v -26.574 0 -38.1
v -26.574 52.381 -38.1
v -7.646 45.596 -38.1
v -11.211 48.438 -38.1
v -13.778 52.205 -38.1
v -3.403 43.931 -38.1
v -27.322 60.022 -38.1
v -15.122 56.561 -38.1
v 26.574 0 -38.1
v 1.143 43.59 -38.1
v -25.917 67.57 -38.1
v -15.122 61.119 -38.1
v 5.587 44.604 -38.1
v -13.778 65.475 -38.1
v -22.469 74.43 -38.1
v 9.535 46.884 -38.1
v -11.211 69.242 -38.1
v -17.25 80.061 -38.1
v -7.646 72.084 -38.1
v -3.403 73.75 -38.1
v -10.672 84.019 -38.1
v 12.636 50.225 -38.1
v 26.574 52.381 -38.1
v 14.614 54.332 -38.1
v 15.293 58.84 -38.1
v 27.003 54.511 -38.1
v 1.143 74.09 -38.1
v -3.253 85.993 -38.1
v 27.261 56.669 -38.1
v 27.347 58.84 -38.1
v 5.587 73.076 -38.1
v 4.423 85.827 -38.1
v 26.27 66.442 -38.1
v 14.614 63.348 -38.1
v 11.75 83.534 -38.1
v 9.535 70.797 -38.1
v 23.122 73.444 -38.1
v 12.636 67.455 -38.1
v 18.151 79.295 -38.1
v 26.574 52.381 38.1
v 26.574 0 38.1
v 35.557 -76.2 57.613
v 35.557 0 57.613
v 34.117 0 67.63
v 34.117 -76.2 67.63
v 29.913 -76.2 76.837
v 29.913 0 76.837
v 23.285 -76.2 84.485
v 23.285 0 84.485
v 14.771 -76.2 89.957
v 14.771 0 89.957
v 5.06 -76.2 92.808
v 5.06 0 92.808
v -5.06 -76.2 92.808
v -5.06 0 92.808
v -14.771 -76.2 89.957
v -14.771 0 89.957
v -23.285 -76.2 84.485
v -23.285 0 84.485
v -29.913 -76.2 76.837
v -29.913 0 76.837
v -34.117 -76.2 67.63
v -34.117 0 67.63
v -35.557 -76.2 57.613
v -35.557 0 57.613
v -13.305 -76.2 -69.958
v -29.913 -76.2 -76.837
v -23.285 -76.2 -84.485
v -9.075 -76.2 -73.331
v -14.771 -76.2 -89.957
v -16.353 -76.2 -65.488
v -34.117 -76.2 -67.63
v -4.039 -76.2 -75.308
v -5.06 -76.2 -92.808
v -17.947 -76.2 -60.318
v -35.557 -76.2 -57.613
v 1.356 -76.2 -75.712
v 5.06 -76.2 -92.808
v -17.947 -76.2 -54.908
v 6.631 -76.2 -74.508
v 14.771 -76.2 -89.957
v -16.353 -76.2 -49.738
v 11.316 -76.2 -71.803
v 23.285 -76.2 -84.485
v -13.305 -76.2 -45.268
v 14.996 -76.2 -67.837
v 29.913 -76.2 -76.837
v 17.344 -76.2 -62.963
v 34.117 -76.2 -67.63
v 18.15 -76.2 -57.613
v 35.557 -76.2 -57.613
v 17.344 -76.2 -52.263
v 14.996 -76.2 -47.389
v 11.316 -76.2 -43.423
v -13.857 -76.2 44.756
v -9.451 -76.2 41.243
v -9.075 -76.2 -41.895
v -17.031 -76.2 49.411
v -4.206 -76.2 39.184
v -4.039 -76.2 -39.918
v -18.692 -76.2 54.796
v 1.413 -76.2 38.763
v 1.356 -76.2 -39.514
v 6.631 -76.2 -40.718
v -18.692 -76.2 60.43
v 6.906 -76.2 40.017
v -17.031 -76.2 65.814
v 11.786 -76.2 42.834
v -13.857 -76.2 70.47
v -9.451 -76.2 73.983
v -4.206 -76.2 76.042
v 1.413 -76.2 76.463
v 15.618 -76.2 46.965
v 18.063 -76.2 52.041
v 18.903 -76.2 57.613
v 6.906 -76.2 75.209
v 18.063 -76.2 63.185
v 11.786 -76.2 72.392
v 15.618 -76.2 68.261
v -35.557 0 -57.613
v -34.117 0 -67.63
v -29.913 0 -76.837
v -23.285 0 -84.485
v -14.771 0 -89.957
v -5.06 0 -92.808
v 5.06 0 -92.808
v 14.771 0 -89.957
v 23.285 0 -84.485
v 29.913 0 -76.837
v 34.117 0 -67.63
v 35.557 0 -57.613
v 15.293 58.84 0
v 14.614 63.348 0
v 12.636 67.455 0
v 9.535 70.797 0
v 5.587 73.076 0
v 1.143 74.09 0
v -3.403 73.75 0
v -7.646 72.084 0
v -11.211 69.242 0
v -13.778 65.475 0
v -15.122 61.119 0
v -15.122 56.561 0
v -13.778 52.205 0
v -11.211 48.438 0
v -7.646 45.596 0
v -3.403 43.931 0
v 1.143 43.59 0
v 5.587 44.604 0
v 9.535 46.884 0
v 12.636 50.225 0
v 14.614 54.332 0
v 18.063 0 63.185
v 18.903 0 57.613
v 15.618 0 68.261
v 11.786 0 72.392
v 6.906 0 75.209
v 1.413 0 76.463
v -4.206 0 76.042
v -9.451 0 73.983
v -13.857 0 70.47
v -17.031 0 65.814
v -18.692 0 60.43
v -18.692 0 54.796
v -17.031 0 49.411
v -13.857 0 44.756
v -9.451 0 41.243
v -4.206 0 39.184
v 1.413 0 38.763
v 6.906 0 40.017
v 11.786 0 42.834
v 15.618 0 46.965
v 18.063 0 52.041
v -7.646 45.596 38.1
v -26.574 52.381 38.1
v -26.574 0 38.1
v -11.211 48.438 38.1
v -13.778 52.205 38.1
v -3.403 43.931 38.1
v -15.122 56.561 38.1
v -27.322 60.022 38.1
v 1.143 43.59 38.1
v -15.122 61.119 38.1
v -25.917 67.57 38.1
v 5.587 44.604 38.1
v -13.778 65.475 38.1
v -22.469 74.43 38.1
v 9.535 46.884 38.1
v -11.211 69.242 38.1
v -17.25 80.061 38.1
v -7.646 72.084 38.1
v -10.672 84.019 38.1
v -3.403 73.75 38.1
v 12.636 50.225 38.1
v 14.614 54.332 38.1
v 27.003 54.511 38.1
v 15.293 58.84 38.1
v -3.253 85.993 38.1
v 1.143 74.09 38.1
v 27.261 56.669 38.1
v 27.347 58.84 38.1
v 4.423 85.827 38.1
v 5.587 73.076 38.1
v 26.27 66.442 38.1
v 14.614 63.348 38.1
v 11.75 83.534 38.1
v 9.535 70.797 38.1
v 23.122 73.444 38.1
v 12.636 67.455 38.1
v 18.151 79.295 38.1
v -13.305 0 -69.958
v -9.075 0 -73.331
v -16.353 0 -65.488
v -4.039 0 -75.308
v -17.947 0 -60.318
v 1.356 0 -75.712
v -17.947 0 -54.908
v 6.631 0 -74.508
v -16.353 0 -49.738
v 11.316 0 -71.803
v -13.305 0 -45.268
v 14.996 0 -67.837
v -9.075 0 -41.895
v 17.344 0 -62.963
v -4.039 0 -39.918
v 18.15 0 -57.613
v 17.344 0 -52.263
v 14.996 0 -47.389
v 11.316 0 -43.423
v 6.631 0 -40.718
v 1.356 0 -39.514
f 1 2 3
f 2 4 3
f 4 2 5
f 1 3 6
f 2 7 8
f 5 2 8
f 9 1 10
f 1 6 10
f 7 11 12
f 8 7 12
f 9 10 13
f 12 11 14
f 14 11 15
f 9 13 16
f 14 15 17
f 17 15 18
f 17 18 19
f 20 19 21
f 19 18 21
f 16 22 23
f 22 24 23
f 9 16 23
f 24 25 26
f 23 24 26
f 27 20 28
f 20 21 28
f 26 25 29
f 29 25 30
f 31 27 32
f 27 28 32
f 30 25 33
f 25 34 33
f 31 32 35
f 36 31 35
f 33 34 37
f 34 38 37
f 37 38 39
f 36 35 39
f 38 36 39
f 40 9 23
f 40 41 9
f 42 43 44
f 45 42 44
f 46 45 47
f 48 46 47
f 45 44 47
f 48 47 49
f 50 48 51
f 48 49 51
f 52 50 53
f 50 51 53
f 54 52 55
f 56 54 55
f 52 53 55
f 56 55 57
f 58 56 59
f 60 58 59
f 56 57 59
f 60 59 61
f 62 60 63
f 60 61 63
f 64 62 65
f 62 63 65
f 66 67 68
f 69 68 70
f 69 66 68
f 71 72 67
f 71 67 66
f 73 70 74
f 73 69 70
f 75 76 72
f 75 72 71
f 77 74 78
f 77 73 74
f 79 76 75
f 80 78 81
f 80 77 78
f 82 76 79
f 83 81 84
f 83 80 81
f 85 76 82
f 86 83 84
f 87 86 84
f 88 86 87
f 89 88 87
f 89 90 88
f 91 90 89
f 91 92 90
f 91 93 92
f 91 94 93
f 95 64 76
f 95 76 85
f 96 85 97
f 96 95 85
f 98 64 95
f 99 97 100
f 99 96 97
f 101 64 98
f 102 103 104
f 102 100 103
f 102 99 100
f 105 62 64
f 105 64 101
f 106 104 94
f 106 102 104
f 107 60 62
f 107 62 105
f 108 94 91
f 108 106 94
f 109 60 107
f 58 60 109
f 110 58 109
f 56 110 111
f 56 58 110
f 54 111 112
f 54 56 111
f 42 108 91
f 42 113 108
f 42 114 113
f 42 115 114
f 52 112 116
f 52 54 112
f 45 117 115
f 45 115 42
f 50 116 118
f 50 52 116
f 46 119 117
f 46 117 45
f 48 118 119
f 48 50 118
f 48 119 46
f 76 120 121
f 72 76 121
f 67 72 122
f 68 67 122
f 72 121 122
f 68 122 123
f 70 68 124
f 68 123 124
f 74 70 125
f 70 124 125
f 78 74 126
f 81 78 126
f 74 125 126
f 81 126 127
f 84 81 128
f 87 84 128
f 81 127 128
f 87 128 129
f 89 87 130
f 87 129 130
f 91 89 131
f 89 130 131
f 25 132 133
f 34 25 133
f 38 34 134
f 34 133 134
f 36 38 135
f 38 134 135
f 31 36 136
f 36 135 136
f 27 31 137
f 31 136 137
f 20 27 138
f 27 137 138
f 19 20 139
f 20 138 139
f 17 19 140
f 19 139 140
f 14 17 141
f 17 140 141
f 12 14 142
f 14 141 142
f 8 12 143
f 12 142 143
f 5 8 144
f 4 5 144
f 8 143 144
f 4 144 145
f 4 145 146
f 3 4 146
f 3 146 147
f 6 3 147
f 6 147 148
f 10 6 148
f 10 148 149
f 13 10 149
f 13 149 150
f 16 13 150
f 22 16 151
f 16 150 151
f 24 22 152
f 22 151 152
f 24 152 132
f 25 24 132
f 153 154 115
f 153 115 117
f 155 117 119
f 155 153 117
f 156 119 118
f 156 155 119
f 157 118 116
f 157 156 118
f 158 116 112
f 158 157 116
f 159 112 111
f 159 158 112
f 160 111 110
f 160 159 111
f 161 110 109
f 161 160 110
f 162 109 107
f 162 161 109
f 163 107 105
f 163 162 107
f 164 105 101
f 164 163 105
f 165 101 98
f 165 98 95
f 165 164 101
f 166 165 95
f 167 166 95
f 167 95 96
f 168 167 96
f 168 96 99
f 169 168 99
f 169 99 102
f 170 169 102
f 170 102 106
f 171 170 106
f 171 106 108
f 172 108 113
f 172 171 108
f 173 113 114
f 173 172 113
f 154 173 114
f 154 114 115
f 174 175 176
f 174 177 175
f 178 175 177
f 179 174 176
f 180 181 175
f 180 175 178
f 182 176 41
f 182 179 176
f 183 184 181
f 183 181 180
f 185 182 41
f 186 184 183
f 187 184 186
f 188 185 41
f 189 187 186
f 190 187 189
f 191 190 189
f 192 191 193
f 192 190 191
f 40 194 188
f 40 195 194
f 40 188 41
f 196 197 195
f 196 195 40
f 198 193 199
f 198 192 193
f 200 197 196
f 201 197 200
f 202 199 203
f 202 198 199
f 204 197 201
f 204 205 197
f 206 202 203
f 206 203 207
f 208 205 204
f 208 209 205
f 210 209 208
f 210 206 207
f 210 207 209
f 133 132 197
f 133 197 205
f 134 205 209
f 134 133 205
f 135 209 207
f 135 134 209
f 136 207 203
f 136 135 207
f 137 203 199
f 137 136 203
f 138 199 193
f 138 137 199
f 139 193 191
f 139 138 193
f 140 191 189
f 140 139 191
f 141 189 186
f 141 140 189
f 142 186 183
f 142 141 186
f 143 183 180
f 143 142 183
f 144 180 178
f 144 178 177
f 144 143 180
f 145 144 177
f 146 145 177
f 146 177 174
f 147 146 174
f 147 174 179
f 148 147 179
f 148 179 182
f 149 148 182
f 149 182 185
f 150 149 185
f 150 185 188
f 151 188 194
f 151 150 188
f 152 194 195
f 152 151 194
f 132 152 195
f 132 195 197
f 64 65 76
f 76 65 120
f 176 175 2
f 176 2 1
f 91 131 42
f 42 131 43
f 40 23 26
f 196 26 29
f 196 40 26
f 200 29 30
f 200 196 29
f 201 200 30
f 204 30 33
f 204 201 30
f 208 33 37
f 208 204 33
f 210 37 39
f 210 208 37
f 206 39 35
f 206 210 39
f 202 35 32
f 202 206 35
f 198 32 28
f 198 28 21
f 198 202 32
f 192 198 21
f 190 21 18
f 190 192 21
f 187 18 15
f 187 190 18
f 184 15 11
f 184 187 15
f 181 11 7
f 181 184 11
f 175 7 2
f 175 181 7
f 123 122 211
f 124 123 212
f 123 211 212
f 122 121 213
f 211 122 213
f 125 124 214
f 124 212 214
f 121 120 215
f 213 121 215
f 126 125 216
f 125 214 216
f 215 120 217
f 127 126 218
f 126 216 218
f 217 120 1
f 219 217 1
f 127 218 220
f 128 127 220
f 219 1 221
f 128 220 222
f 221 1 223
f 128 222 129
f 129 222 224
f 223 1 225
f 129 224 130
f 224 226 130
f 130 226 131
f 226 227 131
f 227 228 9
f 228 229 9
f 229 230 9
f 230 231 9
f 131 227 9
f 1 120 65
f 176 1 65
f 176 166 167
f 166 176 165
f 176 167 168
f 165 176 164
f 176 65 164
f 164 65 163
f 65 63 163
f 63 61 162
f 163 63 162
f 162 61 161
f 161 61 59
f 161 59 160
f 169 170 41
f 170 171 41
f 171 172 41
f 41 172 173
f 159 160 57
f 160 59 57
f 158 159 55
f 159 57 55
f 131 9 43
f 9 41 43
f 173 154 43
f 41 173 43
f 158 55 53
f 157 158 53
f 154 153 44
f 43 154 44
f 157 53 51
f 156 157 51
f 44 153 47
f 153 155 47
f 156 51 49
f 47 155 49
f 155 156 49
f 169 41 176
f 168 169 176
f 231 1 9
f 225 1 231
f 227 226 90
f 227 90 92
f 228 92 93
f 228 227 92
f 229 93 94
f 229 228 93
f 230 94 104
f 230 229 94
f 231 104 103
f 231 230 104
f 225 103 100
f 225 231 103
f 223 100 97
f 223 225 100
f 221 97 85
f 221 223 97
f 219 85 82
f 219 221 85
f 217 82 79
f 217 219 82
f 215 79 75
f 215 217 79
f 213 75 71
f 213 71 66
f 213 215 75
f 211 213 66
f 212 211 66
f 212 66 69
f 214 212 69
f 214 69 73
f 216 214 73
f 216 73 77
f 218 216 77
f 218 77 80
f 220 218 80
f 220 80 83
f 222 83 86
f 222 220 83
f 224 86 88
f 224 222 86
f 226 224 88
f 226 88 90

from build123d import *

# Parameters (mm, degrees)
F0_R          = 18.15
F0_R_2        = 18.902714
F1_DEPTH      = 76.2
F2_R          = 15.292953
F3_DEPTH      = 38.1
F3_DEPTH_BACK = 38.1


with BuildPart() as f1:
    # F0 (on Front) → F1 (new body)
    with BuildSketch(Plane.XZ):
        with BuildLine():
            Line((35.557076, -57.612903), (35.557076, 57.612903))
            ThreePointArc((35.557076, 57.612903), (0, 93.16998), (-35.557076, 57.612903))
            Line((-35.557076, 57.612903), (-35.557076, -57.612903))
            ThreePointArc((-35.557076, -57.612903), (0, -93.16998), (35.557076, -57.612903))
        make_face()
        with Locations((0, -57.612903)):
            Circle(F0_R, mode=Mode.SUBTRACT)
        with Locations((0, 57.612903)):
            Circle(F0_R_2, mode=Mode.SUBTRACT)
    extrude(amount=F1_DEPTH)

    # F2 (on Top) → F3 (join, two sides)
    with BuildSketch(Plane.XY) as f3_sk:
        with BuildLine():
            ThreePointArc((-26.573732, 52.381215), (0, 31.492677), (26.573732, 52.381215))
            ThreePointArc((26.573732, 52.381215), (27.153292, 55.587559), (27.347397, 58.840074))
            ThreePointArc((27.347397, 58.840074), (-3.252515, 85.993366), (-26.573732, 52.381215))
        make_face()
        with Locations((0, 58.840074)):
            Circle(F2_R, mode=Mode.SUBTRACT)
        with BuildLine():
            Line((26.573732, 0), (26.573732, 52.381215))
            ThreePointArc((26.573732, 52.381215), (0, 31.492677), (-26.573732, 52.381215))
            Line((-26.573732, 52.381215), (-26.573732, 0))
            Line((-26.573732, 0), (26.573732, 0))
        make_face()
    extrude(amount=F3_DEPTH)
    extrude(f3_sk.sketch, amount=-F3_DEPTH_BACK)


solid = f1.part
